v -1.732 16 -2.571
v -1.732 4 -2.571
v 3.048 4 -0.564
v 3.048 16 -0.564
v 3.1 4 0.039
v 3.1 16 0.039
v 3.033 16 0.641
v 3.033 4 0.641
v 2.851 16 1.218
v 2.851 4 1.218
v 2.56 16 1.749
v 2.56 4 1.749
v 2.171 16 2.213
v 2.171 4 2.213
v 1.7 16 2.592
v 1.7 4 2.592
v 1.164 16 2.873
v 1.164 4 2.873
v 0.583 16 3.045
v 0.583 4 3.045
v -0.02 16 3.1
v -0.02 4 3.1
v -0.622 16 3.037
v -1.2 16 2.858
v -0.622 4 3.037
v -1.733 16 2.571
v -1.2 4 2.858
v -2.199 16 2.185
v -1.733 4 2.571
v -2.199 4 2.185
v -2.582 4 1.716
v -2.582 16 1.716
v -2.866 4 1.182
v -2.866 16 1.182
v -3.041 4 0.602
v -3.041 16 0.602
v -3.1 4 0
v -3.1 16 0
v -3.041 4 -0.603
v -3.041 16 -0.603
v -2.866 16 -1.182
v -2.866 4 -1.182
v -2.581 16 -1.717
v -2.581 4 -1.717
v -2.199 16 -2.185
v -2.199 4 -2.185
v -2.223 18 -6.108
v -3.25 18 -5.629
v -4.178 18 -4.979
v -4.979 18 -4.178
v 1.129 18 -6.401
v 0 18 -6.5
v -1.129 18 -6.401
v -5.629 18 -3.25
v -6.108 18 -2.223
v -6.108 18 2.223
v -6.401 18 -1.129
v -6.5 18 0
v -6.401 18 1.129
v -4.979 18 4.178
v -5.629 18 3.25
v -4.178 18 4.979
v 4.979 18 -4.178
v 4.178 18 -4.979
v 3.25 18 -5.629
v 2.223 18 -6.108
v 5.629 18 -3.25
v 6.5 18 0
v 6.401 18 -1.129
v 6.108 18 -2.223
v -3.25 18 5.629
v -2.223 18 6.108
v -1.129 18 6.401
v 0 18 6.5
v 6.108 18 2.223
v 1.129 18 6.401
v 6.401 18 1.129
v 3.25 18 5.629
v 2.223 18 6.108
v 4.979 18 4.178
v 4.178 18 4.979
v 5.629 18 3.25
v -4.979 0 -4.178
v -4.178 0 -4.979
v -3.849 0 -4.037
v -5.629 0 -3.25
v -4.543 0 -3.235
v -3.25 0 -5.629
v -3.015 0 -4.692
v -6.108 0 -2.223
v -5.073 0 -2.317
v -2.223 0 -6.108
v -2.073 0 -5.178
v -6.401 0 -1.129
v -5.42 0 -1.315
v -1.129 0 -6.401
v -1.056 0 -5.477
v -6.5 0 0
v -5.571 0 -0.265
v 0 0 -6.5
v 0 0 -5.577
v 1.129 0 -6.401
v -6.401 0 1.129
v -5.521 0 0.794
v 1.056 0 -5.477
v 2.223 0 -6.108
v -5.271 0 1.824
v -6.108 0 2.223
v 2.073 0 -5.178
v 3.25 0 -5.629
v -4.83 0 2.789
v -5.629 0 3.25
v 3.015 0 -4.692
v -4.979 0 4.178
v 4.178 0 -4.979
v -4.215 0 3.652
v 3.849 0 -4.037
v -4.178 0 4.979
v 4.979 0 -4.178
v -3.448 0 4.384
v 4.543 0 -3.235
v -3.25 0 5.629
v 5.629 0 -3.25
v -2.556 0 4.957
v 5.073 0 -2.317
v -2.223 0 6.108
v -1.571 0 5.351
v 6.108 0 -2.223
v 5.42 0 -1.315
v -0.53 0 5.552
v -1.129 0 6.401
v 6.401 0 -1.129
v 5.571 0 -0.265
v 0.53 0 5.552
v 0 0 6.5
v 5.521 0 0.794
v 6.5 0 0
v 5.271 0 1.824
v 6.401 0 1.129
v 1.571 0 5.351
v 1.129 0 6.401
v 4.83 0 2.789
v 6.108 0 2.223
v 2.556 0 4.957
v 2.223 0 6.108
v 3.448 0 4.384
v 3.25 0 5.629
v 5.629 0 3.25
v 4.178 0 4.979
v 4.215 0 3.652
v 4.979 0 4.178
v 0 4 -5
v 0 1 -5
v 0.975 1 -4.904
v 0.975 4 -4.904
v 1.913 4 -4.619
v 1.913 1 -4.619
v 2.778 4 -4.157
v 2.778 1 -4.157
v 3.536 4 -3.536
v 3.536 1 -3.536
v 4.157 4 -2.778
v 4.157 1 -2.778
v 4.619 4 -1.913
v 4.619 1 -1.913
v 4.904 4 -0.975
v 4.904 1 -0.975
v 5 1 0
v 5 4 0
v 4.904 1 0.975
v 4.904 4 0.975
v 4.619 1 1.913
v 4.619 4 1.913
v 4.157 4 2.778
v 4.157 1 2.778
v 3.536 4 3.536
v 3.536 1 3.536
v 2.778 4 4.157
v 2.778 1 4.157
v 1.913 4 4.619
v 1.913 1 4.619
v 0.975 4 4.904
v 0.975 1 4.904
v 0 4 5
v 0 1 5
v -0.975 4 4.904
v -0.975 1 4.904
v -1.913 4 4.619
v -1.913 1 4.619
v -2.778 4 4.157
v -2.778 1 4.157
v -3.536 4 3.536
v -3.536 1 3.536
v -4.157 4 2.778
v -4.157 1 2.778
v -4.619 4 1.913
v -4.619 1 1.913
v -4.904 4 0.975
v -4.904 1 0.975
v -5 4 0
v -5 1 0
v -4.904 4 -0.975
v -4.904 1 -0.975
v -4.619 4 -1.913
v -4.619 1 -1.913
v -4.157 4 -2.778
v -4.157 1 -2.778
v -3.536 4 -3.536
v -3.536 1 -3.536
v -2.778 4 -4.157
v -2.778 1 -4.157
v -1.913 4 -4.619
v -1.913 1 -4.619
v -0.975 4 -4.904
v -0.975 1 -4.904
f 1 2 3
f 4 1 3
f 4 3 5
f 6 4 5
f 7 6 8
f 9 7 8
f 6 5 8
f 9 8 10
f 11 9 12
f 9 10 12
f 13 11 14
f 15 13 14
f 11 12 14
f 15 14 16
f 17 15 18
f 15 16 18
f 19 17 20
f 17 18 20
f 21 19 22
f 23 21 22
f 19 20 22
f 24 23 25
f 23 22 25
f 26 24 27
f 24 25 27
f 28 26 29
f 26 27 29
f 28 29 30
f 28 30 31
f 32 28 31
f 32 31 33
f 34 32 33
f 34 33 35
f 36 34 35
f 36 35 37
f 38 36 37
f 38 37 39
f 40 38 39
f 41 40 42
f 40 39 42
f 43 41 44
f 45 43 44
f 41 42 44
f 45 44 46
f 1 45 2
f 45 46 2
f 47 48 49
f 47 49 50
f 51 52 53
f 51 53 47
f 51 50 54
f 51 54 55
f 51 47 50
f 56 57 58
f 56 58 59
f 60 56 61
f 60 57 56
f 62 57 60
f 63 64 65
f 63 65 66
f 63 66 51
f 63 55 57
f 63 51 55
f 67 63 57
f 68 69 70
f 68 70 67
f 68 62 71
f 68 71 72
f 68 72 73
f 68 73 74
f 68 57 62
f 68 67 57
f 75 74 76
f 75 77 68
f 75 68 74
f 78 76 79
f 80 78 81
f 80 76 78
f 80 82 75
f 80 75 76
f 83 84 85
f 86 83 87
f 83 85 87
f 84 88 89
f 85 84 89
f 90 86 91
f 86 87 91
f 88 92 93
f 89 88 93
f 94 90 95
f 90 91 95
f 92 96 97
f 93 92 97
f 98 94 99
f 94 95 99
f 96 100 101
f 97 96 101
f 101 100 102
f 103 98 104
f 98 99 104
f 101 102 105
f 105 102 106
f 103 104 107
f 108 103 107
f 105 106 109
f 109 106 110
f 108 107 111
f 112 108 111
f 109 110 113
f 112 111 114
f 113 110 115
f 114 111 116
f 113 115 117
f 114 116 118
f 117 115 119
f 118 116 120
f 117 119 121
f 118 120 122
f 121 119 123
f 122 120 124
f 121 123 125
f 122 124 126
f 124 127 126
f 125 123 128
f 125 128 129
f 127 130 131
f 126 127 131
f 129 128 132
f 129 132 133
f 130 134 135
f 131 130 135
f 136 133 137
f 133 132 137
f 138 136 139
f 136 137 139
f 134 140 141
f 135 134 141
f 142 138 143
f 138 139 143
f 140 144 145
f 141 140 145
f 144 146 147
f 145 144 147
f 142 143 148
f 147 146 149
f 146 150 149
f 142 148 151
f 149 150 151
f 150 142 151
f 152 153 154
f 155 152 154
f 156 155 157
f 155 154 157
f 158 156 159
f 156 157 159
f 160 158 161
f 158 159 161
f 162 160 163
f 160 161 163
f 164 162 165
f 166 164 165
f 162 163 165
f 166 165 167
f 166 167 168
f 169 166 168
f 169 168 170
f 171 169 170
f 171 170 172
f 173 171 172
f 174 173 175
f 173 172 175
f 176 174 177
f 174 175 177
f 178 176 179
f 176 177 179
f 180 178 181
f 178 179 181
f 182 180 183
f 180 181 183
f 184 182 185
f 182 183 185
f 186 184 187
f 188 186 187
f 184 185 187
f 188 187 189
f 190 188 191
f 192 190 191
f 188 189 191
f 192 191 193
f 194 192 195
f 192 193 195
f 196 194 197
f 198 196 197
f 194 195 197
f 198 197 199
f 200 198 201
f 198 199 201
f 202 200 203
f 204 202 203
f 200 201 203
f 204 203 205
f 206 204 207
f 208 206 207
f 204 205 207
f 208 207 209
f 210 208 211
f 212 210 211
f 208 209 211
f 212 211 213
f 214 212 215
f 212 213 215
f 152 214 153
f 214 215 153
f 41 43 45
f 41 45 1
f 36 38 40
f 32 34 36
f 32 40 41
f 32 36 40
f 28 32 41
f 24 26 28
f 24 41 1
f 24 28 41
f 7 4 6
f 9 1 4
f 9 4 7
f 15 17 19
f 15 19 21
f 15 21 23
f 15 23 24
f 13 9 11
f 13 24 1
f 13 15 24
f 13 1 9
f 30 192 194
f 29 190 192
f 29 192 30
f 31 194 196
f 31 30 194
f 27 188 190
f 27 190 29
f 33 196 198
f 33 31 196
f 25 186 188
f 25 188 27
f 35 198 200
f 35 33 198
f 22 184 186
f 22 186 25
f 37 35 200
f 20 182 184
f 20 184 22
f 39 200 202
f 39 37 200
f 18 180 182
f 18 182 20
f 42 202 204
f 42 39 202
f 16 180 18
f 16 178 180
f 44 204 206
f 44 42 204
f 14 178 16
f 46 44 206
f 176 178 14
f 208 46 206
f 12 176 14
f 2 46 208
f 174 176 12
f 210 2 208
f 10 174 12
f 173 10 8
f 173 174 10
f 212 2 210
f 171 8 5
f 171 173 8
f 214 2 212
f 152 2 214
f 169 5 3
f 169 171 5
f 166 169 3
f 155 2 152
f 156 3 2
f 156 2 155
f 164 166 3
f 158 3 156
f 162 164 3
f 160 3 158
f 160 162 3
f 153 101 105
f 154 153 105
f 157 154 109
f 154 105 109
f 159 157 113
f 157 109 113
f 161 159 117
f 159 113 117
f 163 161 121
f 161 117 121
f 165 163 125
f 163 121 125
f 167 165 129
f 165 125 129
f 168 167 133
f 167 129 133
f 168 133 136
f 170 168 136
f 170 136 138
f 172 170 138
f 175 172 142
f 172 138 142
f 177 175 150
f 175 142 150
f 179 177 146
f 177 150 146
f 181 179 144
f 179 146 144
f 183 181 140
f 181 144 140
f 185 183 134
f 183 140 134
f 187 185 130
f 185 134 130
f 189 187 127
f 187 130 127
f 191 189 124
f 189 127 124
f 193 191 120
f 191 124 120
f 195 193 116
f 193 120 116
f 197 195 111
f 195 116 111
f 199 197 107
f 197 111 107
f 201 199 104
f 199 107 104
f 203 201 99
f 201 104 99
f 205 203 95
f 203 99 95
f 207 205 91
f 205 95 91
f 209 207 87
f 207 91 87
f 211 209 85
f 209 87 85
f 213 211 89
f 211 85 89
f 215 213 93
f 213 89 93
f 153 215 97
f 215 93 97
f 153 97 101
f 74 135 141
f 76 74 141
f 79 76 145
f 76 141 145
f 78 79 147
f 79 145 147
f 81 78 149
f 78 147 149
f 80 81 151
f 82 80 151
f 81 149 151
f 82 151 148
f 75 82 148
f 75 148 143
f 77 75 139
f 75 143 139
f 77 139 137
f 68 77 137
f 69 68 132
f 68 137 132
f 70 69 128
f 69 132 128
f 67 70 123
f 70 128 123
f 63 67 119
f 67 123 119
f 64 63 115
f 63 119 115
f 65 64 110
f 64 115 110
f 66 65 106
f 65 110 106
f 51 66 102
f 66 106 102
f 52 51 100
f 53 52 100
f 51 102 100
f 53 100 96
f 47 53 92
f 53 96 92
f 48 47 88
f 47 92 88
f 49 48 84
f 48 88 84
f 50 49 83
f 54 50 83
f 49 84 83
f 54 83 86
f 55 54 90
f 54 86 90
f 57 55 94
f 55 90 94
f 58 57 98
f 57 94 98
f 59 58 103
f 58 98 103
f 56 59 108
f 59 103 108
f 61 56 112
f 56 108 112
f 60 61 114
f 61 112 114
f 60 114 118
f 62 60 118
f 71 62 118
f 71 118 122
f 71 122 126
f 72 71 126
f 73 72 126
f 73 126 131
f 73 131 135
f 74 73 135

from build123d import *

# Parameters (mm, degrees)
SKETCH1_R           = 6.5
BOSS_EXTRUDE1_DEPTH = 18
SKETCH2_R           = 5
CUT_EXTRUDE1_DEPTH  = 4
CUT_EXTRUDE2_DEPTH  = 12
CHAMFER1_SIZE       = 1
CHAMFER1_SIZE2      = 0.577350269


with BuildPart() as part:
    # Sketch1 → Boss-Extrude1 (new body)
    with BuildSketch(Plane(origin=(0, 0, 0), x_dir=(1, 0, 0), z_dir=(0, 1, 0))):
        with Locations(Location((0, 0, 0), (0, 0, 270))):
            Circle(SKETCH1_R)
    extrude(amount=BOSS_EXTRUDE1_DEPTH)

    # Sketch2 → Cut-Extrude1 (cut)
    with BuildSketch(Plane.XZ):
        with Locations(Location((0, 0, 0), (0, 0, 270))):
            Circle(SKETCH2_R)
    extrude(amount=-CUT_EXTRUDE1_DEPTH, mode=Mode.SUBTRACT)

    # Sketch3 → Cut-Extrude2 (cut)
    with BuildSketch(Plane.XZ.offset(-4)):
        with BuildLine():
            Line((-1.732055507, -2.57098886), (3.04828024, -0.563903873))
            ThreePointArc((3.04828024, -0.563903873), (-1.200087257, 2.858284551), (-1.732055507, -2.57098886))
        make_face()
    extrude(amount=-CUT_EXTRUDE2_DEPTH, mode=Mode.SUBTRACT)

    # Chamfer1
    chamfer1_edges = [part.edges().sort_by_distance(p)[0] for p in [
        (0, 0, 5),
    ]]
    chamfer1_side = [part.faces().sort_by_distance(p)[0] for p in [
        (0, 2, 5),
    ]]
    chamfer(chamfer1_edges, length=CHAMFER1_SIZE, length2=CHAMFER1_SIZE2, reference=chamfer1_side[0])


solid = part.part
